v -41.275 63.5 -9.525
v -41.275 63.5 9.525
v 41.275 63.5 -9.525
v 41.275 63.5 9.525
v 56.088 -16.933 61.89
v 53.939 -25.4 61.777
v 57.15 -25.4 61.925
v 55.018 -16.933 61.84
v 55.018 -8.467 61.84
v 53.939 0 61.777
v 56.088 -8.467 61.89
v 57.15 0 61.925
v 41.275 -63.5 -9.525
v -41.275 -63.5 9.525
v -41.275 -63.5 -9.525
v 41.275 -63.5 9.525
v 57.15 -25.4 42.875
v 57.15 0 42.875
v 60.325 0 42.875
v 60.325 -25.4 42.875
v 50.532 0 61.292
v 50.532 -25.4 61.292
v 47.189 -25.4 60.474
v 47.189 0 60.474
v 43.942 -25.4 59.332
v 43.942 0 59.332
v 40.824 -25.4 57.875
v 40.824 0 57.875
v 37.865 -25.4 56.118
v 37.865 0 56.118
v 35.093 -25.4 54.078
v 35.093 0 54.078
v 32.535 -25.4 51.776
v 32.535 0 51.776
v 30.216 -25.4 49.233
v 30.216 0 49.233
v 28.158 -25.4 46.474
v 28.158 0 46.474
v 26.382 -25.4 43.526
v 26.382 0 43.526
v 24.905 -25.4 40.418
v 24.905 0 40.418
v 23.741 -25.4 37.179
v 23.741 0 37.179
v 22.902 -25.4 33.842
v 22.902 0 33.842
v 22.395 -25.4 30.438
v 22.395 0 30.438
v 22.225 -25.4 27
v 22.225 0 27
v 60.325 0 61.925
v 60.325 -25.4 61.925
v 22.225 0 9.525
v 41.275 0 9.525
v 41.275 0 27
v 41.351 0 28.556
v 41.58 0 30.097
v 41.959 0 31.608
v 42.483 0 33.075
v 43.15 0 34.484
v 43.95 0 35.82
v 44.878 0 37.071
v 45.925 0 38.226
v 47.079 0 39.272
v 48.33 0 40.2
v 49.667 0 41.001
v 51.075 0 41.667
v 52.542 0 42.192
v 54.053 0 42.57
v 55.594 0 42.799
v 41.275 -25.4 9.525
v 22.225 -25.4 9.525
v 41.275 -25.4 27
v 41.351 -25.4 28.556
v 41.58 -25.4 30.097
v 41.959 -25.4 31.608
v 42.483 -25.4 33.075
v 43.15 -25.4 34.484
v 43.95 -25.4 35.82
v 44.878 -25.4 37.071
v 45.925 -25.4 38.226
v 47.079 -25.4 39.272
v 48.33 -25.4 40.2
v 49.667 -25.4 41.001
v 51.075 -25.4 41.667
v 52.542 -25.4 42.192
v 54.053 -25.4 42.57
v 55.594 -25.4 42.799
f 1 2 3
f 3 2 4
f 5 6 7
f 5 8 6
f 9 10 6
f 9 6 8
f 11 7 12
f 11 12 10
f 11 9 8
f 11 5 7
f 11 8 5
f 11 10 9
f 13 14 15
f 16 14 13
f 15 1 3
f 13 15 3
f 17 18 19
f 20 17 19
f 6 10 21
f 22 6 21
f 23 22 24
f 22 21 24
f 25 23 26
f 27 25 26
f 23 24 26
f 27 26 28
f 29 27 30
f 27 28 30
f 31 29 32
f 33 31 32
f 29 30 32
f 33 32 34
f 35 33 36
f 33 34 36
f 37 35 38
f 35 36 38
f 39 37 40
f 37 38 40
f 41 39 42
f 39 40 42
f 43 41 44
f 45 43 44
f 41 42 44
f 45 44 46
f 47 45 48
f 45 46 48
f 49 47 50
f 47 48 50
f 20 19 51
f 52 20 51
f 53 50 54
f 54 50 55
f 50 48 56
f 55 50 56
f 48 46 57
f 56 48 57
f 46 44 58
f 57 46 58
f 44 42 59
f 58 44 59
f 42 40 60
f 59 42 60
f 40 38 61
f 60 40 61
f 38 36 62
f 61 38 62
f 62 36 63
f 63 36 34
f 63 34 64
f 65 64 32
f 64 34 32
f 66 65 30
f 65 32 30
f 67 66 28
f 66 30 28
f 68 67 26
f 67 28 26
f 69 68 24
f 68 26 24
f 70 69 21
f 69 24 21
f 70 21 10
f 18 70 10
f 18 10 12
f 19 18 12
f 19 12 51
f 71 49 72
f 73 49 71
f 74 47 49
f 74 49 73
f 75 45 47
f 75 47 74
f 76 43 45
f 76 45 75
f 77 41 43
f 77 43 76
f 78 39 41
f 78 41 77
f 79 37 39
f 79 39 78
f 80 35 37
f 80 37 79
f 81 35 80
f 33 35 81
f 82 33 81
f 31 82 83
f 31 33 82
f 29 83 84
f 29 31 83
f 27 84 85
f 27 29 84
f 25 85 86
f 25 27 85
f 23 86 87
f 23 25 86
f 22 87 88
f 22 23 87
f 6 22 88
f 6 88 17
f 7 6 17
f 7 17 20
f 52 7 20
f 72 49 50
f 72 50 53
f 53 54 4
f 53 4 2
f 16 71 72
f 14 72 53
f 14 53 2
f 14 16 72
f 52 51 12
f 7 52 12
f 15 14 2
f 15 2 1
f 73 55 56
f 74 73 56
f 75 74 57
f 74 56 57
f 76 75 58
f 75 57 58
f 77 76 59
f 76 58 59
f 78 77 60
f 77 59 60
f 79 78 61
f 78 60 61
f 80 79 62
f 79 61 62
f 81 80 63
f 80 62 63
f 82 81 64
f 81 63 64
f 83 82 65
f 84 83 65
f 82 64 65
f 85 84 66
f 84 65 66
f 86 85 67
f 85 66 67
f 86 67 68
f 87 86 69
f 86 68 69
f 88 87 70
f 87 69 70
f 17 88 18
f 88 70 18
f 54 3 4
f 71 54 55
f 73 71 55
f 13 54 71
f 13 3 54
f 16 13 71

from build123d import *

# Parameters (mm, degrees)
F1_DEPTH = 63.5
F2_DEPTH = 25.4


with BuildPart() as f1:
    # F0 (on Front) → F1 (new body, symmetric)
    with BuildSketch(Plane.XZ):
        Polygon((41.275, -9.525), (41.275, 9.525), (22.225, 9.525), (-41.275, 9.525), (-41.275, -9.525), align=None)
    extrude(amount=F1_DEPTH, both=True)

    # F0 (on Front) → F2 (join)
    with BuildSketch(Plane.XZ):
        with BuildLine():
            Line((22.225, 9.525), (41.275, 9.525))
            Line((41.275, 9.525), (41.275, 27.0002))
            ThreePointArc((41.275, 27.0002), (45.92468, 38.22552), (57.15, 42.8752))
            Line((57.15, 42.8752), (60.325, 42.8752))
            Line((60.325, 42.8752), (60.325, 61.9252))
            Line((60.325, 61.9252), (57.15, 61.9252))
            add(Edge.make_bspline(
                [(53.938805, 61.777259), (55.022101, 61.84726), (56.092999, 61.896827), (57.15, 61.9252)],
                knots=[108.524772, 108.524772, 108.524772, 108.524772, 111.504536, 111.504536, 111.504536, 111.504536], degree=3))
            ThreePointArc((53.938805, 61.777259), (31.343929, 50.533205), (22.225, 27.0002))
            Line((22.225, 27.0002), (22.225, 9.525))
        make_face()
    extrude(amount=F2_DEPTH)


solid = f1.part
